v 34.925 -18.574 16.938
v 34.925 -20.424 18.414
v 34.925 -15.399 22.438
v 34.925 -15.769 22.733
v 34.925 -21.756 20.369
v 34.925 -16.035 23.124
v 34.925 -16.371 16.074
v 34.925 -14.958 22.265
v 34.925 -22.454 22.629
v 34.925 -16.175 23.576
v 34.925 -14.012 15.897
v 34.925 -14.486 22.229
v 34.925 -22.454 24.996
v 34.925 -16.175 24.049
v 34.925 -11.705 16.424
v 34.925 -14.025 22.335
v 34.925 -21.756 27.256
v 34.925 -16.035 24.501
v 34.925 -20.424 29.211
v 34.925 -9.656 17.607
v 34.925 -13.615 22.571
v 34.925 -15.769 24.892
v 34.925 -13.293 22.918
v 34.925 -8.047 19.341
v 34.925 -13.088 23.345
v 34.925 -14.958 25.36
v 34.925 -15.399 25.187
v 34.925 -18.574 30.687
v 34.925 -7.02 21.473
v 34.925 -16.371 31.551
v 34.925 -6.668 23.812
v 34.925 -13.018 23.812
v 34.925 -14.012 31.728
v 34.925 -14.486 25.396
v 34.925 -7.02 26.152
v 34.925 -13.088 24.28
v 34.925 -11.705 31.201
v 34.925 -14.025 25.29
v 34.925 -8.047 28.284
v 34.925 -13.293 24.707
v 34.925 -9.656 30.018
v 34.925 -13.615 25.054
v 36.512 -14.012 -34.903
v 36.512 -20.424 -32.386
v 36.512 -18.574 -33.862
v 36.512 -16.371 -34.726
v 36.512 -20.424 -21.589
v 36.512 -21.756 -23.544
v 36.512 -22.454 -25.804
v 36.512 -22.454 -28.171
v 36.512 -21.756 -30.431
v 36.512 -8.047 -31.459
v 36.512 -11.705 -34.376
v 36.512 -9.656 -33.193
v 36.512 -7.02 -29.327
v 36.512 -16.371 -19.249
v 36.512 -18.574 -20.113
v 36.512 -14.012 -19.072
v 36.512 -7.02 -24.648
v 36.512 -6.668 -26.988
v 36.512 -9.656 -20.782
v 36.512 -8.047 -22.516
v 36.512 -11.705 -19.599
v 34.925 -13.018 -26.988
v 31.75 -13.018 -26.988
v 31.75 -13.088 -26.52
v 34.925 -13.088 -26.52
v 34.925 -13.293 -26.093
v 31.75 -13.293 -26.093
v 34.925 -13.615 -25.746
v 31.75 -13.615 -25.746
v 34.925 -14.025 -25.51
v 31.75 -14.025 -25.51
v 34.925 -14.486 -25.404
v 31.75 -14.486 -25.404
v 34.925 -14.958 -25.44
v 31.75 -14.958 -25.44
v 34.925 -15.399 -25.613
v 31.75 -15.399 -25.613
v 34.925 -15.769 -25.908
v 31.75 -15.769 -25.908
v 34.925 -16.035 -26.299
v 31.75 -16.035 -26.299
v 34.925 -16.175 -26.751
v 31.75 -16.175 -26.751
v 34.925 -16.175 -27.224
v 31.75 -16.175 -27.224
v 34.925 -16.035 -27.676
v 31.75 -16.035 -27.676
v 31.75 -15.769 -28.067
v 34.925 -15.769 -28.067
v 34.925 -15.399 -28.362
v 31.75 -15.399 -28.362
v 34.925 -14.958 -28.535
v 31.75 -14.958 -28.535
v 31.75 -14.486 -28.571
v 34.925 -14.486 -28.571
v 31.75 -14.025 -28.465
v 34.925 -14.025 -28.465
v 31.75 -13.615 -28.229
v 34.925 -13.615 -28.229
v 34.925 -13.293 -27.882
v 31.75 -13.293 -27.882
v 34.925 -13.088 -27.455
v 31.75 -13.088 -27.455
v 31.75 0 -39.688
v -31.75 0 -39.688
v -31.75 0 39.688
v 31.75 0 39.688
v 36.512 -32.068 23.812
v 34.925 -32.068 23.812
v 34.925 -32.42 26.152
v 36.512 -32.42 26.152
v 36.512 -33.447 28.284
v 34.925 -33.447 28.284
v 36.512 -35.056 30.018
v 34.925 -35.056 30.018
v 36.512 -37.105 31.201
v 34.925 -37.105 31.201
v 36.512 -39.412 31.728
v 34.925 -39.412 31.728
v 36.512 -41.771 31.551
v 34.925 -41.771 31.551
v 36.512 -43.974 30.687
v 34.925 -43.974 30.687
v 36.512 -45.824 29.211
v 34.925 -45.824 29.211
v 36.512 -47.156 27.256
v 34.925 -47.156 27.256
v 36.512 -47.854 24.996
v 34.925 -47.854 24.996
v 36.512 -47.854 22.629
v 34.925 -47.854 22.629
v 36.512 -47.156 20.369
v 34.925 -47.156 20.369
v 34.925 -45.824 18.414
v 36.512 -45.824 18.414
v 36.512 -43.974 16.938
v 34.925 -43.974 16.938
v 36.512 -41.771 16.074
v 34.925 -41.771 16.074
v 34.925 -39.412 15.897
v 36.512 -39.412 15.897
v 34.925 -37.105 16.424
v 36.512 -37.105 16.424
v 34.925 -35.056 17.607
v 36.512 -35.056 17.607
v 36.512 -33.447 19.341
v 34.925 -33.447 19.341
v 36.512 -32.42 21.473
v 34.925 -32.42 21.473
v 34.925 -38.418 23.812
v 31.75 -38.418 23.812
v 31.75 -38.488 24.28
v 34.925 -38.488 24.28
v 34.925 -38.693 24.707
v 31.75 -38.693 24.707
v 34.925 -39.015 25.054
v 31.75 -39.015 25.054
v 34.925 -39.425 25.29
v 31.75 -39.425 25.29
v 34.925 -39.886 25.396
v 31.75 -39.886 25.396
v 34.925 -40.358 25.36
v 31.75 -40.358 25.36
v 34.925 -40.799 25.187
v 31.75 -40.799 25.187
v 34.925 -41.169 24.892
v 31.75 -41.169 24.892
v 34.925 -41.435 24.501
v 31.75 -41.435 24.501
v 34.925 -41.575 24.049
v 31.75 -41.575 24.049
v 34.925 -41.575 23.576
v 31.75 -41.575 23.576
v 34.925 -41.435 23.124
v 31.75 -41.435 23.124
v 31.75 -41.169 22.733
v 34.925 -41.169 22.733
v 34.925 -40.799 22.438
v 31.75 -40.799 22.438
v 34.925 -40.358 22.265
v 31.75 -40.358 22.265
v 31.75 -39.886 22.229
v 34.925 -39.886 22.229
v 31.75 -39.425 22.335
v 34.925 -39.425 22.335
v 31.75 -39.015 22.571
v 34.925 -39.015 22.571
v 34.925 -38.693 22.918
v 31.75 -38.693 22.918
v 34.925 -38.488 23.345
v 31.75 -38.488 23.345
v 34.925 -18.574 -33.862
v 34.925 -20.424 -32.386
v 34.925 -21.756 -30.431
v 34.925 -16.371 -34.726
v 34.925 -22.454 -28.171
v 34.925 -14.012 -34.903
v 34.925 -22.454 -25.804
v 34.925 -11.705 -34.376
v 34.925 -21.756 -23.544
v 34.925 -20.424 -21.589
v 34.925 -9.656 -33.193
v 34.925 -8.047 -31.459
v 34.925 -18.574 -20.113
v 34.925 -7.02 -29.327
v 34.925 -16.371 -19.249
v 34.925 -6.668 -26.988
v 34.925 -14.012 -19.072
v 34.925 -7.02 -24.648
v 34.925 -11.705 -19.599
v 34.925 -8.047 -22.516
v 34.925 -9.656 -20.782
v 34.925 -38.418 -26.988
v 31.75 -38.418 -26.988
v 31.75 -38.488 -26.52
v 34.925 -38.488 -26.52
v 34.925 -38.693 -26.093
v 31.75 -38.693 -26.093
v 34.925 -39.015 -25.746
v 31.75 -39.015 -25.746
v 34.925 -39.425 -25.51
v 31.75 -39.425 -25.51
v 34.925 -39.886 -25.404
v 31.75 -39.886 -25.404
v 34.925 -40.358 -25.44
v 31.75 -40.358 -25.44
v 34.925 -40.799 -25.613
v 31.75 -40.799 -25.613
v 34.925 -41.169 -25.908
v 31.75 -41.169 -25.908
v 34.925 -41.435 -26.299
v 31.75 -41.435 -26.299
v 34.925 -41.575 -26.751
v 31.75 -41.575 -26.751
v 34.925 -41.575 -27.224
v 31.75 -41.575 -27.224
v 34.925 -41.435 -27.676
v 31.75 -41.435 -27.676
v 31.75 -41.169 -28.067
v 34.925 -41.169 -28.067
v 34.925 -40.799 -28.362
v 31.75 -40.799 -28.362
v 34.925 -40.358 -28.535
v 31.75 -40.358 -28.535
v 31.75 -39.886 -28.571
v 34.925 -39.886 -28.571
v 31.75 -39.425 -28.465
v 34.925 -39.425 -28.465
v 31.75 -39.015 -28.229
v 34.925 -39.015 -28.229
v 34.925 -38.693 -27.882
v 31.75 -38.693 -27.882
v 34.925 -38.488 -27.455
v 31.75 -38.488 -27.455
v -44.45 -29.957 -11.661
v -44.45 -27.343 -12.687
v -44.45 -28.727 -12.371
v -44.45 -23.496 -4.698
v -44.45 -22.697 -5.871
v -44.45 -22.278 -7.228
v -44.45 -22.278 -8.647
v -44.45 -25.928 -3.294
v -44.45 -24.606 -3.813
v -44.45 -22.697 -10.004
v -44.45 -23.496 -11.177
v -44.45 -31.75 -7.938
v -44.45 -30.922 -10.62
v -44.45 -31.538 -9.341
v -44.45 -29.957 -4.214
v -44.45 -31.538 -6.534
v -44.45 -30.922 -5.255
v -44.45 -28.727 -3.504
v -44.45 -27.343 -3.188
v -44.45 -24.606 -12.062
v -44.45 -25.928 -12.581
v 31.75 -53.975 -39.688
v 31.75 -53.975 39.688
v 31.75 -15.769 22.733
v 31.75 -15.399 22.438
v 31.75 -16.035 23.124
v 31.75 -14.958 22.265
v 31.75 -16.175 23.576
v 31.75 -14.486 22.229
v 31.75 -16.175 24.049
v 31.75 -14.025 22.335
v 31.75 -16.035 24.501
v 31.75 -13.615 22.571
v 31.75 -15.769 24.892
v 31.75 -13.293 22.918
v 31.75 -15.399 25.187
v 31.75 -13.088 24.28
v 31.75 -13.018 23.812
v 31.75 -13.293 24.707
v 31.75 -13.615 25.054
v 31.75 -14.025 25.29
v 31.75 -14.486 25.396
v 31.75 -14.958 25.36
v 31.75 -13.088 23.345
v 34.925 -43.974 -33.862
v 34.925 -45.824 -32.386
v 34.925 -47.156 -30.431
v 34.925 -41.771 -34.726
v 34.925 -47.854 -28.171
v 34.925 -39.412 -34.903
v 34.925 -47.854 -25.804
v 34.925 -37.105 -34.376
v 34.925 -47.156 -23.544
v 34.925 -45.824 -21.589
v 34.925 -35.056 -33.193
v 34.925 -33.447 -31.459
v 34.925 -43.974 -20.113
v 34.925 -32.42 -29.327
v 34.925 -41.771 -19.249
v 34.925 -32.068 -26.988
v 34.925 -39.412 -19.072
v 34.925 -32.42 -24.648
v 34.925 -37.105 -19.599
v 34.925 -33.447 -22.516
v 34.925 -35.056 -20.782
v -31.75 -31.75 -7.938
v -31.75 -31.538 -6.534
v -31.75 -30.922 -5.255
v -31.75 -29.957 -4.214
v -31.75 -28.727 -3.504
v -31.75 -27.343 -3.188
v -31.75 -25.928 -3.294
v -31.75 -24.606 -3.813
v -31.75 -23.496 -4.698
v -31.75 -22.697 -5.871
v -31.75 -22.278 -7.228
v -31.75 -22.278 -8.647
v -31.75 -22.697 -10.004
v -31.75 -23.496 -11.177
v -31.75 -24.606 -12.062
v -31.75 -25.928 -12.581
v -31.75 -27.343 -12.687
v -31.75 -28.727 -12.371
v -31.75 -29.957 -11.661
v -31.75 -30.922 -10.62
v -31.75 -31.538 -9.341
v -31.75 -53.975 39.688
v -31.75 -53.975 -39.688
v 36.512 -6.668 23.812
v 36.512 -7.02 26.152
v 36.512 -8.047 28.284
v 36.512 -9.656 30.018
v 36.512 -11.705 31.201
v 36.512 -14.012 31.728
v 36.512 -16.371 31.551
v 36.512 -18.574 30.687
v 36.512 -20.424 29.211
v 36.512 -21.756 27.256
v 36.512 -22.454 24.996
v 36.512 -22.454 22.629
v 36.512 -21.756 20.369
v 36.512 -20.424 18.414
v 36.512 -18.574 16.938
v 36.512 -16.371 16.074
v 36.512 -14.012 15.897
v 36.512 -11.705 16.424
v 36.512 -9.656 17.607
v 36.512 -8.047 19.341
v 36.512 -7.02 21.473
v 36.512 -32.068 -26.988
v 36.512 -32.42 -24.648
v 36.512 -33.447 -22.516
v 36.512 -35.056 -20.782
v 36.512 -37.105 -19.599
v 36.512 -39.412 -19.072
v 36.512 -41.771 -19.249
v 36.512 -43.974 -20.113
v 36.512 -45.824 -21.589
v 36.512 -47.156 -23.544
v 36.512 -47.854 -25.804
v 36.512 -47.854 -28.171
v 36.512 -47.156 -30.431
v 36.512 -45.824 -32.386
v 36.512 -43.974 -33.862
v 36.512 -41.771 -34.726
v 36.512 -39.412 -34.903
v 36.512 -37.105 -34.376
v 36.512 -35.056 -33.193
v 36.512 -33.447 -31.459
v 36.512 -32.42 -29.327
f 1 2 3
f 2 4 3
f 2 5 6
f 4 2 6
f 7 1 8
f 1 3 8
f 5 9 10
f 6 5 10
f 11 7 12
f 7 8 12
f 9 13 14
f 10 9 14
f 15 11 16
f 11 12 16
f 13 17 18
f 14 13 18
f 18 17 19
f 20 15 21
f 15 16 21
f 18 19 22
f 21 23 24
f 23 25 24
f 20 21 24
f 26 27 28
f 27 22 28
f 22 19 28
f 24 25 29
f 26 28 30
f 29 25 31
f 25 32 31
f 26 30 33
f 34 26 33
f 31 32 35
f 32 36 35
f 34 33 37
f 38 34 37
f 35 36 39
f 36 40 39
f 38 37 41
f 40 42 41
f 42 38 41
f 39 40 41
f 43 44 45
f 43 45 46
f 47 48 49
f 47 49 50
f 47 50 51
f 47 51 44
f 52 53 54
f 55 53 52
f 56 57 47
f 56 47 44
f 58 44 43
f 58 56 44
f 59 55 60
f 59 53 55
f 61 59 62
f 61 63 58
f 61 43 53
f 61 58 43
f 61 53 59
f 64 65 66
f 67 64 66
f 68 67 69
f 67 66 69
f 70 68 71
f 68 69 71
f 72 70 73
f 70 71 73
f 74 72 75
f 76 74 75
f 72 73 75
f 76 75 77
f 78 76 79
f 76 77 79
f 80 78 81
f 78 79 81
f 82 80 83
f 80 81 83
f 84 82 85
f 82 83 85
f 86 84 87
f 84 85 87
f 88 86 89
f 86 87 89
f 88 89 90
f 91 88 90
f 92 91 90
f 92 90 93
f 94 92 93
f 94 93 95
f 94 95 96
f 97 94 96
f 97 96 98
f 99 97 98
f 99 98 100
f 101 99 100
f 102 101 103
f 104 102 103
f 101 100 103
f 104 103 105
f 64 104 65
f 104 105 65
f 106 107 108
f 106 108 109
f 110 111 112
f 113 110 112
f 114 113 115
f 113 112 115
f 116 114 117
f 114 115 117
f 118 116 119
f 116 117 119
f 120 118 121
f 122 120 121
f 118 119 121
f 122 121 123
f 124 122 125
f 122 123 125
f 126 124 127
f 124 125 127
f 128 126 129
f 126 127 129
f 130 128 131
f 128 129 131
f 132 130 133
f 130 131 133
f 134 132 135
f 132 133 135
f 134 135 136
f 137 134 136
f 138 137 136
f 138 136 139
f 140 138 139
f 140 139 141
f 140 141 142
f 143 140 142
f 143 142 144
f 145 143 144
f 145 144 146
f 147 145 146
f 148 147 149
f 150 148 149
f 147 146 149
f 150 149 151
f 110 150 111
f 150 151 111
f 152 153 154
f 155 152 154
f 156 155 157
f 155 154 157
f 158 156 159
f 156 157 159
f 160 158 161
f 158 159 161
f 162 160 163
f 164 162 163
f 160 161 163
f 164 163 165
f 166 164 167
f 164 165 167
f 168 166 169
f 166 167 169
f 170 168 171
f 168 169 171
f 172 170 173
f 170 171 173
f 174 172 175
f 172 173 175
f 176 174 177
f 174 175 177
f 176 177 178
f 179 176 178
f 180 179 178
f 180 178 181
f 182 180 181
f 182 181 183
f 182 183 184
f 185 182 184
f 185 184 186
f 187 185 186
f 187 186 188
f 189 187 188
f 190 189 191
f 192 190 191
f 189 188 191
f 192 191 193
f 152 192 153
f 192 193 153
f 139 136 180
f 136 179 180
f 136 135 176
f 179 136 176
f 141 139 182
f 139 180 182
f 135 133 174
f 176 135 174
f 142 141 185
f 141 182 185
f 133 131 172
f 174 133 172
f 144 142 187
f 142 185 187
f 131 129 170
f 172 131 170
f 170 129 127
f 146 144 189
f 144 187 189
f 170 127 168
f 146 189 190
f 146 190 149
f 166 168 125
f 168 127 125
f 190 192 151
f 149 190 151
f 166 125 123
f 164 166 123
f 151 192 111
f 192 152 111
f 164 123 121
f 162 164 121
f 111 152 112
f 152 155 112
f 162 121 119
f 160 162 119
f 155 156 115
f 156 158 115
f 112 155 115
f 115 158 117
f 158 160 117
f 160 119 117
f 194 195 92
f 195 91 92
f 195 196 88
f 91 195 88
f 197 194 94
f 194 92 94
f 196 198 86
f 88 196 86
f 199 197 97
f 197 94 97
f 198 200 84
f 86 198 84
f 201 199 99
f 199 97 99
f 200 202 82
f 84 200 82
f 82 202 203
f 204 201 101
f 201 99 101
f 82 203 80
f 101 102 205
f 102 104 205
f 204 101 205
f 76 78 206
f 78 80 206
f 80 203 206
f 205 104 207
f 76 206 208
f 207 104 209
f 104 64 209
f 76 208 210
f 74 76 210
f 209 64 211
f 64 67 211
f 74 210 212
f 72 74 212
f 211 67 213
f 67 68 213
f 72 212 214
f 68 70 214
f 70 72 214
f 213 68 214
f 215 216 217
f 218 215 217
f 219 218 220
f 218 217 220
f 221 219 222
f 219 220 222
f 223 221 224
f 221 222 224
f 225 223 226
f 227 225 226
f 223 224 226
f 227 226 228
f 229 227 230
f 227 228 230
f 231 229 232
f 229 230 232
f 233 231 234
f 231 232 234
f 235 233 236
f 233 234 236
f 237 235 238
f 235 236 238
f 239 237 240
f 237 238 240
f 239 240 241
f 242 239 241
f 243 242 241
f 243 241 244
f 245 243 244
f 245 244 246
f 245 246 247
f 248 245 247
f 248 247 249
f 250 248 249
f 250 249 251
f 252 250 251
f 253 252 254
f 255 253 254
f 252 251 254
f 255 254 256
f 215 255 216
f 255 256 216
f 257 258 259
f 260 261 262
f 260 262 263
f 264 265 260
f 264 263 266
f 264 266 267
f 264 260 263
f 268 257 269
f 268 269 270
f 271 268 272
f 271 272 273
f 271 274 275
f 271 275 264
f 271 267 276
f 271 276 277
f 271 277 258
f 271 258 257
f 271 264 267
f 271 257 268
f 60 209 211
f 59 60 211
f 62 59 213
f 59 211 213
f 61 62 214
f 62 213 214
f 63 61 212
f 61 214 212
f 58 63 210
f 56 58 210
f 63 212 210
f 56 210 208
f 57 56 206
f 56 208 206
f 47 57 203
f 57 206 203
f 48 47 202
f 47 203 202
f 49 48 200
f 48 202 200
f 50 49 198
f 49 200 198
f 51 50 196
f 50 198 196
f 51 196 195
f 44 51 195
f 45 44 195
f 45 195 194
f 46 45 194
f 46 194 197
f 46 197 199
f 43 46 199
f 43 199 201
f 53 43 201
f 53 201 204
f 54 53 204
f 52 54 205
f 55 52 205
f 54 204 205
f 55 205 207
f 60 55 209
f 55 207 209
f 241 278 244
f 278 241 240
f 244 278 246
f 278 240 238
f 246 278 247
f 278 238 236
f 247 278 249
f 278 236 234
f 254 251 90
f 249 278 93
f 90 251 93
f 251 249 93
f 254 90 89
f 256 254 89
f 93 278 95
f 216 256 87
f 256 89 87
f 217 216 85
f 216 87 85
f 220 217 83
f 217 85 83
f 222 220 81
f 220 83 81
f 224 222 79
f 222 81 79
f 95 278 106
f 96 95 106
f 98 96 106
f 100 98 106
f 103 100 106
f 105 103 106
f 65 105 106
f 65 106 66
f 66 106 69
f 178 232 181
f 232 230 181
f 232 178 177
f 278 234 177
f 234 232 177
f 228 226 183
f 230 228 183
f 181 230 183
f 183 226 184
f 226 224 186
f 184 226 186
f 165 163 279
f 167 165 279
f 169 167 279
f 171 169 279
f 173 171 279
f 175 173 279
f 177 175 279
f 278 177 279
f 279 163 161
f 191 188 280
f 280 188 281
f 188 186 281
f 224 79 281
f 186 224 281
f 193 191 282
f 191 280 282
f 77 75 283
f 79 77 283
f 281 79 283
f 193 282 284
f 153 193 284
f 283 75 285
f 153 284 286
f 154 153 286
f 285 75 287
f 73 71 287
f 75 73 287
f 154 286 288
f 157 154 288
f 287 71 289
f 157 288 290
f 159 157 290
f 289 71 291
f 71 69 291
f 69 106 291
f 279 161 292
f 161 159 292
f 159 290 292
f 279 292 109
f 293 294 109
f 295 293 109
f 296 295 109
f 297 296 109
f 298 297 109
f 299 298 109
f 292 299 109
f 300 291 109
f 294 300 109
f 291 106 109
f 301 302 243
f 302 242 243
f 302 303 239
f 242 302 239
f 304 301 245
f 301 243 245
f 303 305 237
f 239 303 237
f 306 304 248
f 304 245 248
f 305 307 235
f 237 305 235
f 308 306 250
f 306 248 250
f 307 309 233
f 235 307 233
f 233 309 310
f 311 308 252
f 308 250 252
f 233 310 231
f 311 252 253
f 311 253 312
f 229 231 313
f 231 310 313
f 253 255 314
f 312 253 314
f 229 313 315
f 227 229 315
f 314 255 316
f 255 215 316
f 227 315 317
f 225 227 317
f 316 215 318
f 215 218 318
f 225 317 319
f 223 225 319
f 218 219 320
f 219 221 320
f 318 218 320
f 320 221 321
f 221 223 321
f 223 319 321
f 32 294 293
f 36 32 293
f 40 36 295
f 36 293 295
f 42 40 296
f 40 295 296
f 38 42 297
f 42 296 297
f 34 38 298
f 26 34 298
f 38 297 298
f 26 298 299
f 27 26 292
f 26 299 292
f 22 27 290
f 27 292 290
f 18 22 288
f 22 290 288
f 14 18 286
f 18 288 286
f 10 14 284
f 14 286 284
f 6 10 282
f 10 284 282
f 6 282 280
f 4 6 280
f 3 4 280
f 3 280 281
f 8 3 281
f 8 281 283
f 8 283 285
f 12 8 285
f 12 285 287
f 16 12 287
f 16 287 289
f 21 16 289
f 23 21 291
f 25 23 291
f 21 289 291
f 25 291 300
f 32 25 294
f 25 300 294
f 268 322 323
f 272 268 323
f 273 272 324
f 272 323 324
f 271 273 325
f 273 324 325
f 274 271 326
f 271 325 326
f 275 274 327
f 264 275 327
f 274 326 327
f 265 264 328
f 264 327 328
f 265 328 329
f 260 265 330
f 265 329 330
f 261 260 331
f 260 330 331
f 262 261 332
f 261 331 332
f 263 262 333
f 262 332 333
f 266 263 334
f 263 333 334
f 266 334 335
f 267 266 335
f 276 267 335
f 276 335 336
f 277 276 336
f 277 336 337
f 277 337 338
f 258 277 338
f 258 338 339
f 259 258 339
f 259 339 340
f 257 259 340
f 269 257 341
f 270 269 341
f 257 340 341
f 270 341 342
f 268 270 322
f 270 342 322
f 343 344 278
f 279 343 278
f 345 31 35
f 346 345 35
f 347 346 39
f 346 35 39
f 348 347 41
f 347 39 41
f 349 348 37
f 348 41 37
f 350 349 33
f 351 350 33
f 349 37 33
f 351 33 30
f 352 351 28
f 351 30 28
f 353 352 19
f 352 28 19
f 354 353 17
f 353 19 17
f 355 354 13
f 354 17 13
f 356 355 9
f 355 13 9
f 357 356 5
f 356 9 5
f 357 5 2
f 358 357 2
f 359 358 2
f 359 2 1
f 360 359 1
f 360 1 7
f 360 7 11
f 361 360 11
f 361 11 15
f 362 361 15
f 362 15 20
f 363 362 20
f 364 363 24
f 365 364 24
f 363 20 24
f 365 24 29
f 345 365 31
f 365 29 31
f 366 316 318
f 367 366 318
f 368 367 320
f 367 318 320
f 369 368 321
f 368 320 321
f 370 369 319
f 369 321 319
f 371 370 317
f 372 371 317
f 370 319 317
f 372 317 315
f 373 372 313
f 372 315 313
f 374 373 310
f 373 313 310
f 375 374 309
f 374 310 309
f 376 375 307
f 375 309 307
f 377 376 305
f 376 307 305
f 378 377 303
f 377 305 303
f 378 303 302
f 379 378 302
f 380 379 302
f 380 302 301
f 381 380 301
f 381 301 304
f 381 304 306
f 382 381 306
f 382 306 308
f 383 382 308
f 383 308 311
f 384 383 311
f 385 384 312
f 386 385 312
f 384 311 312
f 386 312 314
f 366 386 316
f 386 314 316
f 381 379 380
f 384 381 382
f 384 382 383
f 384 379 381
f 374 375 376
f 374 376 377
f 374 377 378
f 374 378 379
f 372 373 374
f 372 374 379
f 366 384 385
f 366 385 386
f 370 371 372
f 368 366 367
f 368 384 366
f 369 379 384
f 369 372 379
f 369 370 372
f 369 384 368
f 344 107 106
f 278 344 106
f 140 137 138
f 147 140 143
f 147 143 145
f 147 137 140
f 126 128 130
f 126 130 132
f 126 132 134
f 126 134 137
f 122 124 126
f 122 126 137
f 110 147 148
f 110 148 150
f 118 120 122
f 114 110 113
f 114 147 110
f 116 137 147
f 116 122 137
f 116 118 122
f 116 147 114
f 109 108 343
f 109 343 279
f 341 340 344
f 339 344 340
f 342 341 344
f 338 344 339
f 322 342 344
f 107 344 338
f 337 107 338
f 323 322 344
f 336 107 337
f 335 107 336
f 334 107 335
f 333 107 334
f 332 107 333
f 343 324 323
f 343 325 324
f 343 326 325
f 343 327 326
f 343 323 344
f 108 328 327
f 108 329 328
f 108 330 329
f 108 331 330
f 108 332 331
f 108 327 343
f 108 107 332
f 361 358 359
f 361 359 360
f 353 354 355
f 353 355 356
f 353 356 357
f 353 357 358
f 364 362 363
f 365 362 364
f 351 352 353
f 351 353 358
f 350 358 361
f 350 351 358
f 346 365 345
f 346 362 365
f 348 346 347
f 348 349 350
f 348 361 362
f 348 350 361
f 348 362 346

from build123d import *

# Parameters (mm, degrees)
F0_W     = 63.5
F0_H     = 79.375
F1_DEPTH = 53.975
F2_R     = 1.5875
F3_DEPTH = 3.175
F4_R     = 7.9375
F5_DEPTH = 1.5875
F6_R     = 4.7625
F7_DEPTH = 12.7


with BuildPart() as f1:
    # F0 (on Front) → F1 (new body)
    with BuildSketch(Plane.XZ):
        Rectangle(F0_W, F0_H)
    extrude(amount=F1_DEPTH)

    # F2 (on face) → F3 (join)
    with BuildSketch(Plane.YZ.offset(31.75)):
        with Locations((-40.005, 23.8125)):
            Circle(F2_R)
        with Locations((-40.005, -26.9875)):
            Circle(F2_R)
        with Locations((-14.605, 23.8125)):
            Circle(F2_R)
        with Locations((-14.605, -26.9875)):
            Circle(F2_R)
    extrude(amount=F3_DEPTH)

    # F4 (on face) → F5 (join)
    with BuildSketch(Plane.YZ.offset(34.925)):
        with Locations((-40.005, 23.8125)):
            Circle(F4_R)
        with Locations((-14.605, 23.8125)):
            Circle(F4_R)
        with Locations((-40.005, -26.9875)):
            Circle(F4_R)
        with Locations((-14.605, -26.9875)):
            Circle(F4_R)
    extrude(amount=F5_DEPTH)

    # F6 (on face) → F7 (join)
    with BuildSketch(Plane(origin=(-31.75, 0, 0), x_dir=(0, -1, 0), z_dir=(-1, 0, 0))):
        with Locations((26.9875, -7.9375)):
            Circle(F6_R)
    extrude(amount=F7_DEPTH)


solid = f1.part
